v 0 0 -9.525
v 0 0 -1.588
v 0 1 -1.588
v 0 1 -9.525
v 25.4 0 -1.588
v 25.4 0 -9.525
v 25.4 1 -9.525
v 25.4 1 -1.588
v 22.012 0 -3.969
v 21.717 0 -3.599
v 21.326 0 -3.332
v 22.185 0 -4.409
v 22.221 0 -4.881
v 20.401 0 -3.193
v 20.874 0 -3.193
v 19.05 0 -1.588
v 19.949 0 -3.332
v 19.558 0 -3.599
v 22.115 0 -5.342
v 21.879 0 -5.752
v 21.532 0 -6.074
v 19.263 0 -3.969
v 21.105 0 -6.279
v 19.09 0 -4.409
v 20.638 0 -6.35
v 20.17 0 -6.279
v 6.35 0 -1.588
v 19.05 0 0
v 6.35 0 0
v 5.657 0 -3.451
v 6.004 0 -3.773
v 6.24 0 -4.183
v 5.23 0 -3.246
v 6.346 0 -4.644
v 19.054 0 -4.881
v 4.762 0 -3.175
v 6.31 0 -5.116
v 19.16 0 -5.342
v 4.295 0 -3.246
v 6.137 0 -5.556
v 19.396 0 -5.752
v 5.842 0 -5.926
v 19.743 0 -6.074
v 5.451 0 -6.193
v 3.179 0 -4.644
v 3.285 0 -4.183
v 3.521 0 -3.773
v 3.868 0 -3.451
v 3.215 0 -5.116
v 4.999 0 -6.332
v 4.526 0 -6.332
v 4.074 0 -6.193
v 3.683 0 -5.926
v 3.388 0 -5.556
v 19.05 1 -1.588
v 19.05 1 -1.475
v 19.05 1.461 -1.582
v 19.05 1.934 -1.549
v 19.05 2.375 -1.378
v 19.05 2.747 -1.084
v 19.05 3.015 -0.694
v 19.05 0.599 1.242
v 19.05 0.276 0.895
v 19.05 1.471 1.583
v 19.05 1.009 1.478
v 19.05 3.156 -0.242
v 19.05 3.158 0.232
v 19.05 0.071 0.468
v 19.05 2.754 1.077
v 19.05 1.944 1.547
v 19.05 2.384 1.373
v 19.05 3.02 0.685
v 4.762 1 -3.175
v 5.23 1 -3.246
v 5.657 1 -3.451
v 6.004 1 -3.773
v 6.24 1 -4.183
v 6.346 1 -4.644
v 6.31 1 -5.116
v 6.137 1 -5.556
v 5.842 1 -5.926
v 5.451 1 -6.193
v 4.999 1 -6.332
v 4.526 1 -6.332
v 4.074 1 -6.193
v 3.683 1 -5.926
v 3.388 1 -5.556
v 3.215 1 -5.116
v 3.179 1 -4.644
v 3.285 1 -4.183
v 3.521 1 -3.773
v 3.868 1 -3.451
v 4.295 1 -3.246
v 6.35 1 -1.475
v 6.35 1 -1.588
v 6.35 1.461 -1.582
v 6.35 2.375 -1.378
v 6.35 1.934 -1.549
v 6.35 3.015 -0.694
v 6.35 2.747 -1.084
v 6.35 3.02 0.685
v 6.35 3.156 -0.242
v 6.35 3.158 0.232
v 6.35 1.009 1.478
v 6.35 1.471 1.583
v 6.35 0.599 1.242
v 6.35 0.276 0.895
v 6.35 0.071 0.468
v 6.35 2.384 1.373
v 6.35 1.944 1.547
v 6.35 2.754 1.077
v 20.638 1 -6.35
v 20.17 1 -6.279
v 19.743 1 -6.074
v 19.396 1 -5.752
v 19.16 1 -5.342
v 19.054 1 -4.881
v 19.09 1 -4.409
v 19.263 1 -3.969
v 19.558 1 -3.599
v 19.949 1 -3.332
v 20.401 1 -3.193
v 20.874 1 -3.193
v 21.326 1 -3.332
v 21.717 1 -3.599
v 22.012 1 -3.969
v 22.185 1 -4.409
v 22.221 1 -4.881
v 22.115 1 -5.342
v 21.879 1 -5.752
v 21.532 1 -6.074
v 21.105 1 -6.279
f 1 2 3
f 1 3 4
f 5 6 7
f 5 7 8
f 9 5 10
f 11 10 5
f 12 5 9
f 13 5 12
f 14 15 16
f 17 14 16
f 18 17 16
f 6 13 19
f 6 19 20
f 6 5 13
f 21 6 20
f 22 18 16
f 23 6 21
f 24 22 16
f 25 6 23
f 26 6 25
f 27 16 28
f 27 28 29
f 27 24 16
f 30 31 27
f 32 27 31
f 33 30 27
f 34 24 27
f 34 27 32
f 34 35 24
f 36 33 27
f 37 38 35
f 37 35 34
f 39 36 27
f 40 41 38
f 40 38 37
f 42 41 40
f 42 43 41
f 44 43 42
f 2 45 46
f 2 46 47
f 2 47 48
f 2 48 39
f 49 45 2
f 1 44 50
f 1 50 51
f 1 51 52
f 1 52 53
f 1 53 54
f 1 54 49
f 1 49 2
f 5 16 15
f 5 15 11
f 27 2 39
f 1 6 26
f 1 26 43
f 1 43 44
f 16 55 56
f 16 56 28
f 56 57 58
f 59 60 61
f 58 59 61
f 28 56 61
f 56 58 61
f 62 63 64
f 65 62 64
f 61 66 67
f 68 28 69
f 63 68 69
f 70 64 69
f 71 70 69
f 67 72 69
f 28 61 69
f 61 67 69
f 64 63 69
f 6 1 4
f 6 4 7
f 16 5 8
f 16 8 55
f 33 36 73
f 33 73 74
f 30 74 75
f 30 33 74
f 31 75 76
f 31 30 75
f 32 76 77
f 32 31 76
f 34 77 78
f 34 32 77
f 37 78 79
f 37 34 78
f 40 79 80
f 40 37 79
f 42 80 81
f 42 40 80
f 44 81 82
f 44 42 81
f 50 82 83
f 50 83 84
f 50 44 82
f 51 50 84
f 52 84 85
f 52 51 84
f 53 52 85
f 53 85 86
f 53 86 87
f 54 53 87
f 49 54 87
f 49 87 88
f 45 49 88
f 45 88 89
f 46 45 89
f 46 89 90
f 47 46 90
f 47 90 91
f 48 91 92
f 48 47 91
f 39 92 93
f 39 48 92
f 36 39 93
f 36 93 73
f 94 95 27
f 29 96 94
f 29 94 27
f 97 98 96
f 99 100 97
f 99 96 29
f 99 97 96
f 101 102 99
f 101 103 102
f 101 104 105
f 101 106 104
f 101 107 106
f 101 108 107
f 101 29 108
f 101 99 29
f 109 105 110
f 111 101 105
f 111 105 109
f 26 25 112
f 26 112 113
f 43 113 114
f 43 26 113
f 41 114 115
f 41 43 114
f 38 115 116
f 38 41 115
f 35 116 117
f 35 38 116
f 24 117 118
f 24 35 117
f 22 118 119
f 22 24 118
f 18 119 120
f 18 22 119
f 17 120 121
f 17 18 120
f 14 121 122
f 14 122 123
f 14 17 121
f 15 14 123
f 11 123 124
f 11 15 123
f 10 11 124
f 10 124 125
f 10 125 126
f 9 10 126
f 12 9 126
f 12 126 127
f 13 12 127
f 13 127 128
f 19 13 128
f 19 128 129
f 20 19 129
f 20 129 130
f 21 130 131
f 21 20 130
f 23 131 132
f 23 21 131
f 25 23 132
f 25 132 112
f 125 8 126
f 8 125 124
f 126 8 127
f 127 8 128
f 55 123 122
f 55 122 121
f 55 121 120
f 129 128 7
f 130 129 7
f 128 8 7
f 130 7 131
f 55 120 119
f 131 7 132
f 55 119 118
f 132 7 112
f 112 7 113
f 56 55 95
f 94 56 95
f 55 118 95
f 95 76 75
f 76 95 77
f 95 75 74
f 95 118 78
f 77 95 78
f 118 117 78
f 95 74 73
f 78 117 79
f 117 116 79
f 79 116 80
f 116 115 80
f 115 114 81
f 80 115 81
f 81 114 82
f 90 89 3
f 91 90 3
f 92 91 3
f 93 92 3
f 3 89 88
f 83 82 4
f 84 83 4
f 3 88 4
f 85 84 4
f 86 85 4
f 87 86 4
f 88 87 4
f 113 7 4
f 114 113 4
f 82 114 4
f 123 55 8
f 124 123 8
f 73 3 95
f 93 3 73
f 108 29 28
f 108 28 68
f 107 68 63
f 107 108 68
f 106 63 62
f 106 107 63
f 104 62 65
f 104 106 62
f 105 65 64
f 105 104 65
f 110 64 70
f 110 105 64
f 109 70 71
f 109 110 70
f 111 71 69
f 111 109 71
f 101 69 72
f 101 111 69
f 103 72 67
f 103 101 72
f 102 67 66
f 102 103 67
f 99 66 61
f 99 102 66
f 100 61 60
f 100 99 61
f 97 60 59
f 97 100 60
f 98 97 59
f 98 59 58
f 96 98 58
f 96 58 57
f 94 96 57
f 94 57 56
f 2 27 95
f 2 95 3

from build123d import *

# Parameters (mm, degrees)
SKETCH1_R           = 1.5875
BOSS_EXTRUDE1_DEPTH = 1
SKETCH2_R           = 1.5875
BOSS_EXTRUDE2_DEPTH = 12.7


with BuildPart() as part:
    # Sketch1 → Boss-Extrude1 (new body)
    with BuildSketch(Plane(origin=(0, 0, 0), x_dir=(1, 0, 0), z_dir=(0, 1, 0))):
        Polygon((25.4, 9.525), (25.4, 1.5875), (19.05, 1.5875), (19.05, 0), (6.35, 0), (6.35, 1.5875), (0, 1.5875), (0, 9.525), align=None)
        with Locations(Location((4.7625, 4.7625, 0), (0, 0, 270))):
            Circle(SKETCH1_R, mode=Mode.SUBTRACT)
        with Locations(Location((20.6375, 4.7625, 0), (0, 0, 90))):
            Circle(SKETCH1_R, mode=Mode.SUBTRACT)
    extrude(amount=BOSS_EXTRUDE1_DEPTH)

    # Sketch2 → Boss-Extrude2 (add)
    with BuildSketch(Plane.ZY.offset(-6.35)):
        with Locations((0, 1.5875)):
            Circle(SKETCH2_R)
    extrude(amount=-BOSS_EXTRUDE2_DEPTH)


solid = part.part
